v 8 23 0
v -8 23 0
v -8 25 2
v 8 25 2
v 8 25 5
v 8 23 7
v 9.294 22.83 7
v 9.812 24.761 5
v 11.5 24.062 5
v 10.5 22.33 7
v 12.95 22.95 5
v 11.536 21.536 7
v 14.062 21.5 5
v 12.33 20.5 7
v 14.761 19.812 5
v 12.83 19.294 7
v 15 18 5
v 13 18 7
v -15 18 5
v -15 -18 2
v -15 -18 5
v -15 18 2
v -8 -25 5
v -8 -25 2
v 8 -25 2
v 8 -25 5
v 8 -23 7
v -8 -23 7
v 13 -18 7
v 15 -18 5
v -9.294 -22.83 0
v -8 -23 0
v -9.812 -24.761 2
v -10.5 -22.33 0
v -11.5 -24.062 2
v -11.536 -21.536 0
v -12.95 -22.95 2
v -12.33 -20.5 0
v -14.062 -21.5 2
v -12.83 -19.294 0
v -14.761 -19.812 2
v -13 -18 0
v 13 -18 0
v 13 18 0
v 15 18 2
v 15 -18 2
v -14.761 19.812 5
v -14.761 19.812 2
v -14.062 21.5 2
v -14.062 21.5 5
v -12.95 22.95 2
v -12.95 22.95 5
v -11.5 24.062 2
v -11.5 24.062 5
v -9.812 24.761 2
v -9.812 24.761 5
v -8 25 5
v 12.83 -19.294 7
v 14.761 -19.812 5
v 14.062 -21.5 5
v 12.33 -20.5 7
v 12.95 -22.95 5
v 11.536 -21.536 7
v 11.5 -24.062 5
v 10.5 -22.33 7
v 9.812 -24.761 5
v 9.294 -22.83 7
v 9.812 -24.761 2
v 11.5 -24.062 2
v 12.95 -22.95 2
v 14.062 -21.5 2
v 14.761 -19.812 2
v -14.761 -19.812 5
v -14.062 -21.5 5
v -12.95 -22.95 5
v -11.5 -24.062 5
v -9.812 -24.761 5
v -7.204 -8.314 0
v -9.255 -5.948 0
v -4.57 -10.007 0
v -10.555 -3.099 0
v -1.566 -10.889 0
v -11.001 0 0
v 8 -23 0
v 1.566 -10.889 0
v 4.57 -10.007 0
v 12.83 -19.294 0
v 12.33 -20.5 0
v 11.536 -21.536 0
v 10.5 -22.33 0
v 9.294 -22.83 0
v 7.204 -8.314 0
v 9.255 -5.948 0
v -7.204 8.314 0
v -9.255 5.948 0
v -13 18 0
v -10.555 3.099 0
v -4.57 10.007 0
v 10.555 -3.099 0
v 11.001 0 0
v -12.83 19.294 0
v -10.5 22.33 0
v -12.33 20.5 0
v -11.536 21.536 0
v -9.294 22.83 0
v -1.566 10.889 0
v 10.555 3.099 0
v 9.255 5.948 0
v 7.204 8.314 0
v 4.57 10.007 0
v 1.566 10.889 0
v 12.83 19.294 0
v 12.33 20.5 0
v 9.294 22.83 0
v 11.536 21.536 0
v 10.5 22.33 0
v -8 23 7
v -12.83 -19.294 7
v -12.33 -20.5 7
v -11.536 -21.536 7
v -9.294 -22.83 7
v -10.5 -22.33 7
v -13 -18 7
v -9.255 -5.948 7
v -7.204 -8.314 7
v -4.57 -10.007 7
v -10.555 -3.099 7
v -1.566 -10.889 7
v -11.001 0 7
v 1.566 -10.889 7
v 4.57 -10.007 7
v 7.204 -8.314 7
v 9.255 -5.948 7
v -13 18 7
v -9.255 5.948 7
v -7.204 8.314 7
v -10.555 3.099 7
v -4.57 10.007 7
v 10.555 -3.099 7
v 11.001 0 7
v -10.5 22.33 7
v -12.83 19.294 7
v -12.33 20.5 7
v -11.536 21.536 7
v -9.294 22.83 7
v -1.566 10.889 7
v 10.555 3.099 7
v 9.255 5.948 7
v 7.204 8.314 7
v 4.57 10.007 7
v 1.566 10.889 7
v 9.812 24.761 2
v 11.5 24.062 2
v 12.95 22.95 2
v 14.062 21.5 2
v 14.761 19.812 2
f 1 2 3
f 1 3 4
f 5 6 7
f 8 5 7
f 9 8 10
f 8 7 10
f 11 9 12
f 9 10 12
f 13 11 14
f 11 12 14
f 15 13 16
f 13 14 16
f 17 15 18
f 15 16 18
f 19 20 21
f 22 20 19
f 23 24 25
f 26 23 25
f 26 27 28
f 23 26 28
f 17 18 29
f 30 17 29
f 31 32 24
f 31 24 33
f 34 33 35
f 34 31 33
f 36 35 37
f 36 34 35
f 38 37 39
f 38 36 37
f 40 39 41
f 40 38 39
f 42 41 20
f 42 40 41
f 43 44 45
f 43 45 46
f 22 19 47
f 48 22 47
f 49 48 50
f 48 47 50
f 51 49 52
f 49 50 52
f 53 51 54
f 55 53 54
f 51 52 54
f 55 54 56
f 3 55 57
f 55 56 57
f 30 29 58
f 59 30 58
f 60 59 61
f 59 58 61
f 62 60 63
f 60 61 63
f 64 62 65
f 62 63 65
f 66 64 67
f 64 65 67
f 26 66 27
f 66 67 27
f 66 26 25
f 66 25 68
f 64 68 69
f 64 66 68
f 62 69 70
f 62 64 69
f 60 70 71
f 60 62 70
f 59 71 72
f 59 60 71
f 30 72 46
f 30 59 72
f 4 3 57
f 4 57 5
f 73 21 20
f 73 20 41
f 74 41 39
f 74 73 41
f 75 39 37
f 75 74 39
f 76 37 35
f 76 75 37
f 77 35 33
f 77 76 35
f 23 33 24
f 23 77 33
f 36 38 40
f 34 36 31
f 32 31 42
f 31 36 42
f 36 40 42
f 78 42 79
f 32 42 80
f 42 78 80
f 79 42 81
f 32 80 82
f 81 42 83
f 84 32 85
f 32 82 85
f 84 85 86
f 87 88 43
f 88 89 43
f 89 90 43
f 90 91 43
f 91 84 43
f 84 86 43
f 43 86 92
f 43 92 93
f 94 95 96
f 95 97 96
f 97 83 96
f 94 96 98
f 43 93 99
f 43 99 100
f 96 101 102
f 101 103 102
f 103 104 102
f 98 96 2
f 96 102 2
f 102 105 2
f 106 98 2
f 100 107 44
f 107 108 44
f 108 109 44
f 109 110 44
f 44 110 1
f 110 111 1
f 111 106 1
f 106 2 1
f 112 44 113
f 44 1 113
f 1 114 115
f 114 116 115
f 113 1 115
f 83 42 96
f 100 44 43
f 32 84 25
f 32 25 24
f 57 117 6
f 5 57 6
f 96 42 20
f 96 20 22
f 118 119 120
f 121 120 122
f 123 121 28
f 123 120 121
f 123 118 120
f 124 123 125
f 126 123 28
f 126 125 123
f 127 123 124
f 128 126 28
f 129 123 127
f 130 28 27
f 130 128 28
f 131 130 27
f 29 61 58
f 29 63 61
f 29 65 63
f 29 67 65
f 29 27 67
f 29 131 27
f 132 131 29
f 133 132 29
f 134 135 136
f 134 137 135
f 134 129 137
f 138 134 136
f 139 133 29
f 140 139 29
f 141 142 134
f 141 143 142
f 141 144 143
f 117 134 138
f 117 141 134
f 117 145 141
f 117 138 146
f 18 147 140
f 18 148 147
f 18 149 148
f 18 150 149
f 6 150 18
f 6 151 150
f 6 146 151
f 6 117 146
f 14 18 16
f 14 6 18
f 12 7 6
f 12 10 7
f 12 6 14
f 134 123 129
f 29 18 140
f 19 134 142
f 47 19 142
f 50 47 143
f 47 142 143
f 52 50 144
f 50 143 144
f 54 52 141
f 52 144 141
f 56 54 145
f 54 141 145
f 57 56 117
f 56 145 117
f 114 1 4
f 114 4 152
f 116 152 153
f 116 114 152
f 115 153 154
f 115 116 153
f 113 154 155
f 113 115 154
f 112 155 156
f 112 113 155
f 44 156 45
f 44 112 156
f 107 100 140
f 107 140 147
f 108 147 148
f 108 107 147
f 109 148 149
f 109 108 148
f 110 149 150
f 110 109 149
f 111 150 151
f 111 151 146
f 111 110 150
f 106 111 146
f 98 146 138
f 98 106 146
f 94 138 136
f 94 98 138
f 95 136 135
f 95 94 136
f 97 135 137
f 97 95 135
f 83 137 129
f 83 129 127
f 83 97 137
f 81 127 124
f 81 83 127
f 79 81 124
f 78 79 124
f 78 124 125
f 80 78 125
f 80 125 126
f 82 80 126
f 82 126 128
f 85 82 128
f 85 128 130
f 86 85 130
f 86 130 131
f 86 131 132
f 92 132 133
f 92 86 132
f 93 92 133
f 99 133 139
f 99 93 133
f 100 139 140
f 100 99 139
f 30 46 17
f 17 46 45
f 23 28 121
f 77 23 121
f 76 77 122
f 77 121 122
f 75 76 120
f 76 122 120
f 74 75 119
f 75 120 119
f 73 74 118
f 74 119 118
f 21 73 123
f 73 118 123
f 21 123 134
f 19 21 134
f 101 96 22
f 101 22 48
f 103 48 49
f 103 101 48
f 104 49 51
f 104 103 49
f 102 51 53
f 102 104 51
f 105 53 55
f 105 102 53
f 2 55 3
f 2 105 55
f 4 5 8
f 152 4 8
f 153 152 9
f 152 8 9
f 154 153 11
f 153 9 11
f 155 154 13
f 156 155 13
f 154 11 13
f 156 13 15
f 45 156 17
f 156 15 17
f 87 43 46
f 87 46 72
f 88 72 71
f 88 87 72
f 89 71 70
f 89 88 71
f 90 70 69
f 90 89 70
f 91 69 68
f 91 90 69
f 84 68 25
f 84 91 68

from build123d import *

# Parameters (mm, degrees)
F0_W     = 30
F0_H     = 50
F0_R     = 11.001
F1_DEPTH = 7
F2_R     = 7
F3_SIZE  = 2


with BuildPart() as f1:
    # F0 (on Top) → F1 (new body)
    with BuildSketch(Plane.XY):
        Rectangle(F0_W, F0_H)
        Circle(F0_R, mode=Mode.SUBTRACT)
    extrude(amount=F1_DEPTH)

    # F2
    f2_edges = [f1.edges().sort_by_distance(p)[0] for p in [
        (-15, -25, 3.5),
        (15, -25, 3.5),
        (-15, 25, 3.5),
        (15, 25, 3.5),
    ]]
    fillet(f2_edges, radius=F2_R)

    # F3
    f3_edges = [f1.edges().sort_by_distance(p)[0] for p in [
        (-15, 0, 7),
        (-15, 0, 0),
    ]]
    chamfer(f3_edges, length=F3_SIZE)


solid = f1.part
